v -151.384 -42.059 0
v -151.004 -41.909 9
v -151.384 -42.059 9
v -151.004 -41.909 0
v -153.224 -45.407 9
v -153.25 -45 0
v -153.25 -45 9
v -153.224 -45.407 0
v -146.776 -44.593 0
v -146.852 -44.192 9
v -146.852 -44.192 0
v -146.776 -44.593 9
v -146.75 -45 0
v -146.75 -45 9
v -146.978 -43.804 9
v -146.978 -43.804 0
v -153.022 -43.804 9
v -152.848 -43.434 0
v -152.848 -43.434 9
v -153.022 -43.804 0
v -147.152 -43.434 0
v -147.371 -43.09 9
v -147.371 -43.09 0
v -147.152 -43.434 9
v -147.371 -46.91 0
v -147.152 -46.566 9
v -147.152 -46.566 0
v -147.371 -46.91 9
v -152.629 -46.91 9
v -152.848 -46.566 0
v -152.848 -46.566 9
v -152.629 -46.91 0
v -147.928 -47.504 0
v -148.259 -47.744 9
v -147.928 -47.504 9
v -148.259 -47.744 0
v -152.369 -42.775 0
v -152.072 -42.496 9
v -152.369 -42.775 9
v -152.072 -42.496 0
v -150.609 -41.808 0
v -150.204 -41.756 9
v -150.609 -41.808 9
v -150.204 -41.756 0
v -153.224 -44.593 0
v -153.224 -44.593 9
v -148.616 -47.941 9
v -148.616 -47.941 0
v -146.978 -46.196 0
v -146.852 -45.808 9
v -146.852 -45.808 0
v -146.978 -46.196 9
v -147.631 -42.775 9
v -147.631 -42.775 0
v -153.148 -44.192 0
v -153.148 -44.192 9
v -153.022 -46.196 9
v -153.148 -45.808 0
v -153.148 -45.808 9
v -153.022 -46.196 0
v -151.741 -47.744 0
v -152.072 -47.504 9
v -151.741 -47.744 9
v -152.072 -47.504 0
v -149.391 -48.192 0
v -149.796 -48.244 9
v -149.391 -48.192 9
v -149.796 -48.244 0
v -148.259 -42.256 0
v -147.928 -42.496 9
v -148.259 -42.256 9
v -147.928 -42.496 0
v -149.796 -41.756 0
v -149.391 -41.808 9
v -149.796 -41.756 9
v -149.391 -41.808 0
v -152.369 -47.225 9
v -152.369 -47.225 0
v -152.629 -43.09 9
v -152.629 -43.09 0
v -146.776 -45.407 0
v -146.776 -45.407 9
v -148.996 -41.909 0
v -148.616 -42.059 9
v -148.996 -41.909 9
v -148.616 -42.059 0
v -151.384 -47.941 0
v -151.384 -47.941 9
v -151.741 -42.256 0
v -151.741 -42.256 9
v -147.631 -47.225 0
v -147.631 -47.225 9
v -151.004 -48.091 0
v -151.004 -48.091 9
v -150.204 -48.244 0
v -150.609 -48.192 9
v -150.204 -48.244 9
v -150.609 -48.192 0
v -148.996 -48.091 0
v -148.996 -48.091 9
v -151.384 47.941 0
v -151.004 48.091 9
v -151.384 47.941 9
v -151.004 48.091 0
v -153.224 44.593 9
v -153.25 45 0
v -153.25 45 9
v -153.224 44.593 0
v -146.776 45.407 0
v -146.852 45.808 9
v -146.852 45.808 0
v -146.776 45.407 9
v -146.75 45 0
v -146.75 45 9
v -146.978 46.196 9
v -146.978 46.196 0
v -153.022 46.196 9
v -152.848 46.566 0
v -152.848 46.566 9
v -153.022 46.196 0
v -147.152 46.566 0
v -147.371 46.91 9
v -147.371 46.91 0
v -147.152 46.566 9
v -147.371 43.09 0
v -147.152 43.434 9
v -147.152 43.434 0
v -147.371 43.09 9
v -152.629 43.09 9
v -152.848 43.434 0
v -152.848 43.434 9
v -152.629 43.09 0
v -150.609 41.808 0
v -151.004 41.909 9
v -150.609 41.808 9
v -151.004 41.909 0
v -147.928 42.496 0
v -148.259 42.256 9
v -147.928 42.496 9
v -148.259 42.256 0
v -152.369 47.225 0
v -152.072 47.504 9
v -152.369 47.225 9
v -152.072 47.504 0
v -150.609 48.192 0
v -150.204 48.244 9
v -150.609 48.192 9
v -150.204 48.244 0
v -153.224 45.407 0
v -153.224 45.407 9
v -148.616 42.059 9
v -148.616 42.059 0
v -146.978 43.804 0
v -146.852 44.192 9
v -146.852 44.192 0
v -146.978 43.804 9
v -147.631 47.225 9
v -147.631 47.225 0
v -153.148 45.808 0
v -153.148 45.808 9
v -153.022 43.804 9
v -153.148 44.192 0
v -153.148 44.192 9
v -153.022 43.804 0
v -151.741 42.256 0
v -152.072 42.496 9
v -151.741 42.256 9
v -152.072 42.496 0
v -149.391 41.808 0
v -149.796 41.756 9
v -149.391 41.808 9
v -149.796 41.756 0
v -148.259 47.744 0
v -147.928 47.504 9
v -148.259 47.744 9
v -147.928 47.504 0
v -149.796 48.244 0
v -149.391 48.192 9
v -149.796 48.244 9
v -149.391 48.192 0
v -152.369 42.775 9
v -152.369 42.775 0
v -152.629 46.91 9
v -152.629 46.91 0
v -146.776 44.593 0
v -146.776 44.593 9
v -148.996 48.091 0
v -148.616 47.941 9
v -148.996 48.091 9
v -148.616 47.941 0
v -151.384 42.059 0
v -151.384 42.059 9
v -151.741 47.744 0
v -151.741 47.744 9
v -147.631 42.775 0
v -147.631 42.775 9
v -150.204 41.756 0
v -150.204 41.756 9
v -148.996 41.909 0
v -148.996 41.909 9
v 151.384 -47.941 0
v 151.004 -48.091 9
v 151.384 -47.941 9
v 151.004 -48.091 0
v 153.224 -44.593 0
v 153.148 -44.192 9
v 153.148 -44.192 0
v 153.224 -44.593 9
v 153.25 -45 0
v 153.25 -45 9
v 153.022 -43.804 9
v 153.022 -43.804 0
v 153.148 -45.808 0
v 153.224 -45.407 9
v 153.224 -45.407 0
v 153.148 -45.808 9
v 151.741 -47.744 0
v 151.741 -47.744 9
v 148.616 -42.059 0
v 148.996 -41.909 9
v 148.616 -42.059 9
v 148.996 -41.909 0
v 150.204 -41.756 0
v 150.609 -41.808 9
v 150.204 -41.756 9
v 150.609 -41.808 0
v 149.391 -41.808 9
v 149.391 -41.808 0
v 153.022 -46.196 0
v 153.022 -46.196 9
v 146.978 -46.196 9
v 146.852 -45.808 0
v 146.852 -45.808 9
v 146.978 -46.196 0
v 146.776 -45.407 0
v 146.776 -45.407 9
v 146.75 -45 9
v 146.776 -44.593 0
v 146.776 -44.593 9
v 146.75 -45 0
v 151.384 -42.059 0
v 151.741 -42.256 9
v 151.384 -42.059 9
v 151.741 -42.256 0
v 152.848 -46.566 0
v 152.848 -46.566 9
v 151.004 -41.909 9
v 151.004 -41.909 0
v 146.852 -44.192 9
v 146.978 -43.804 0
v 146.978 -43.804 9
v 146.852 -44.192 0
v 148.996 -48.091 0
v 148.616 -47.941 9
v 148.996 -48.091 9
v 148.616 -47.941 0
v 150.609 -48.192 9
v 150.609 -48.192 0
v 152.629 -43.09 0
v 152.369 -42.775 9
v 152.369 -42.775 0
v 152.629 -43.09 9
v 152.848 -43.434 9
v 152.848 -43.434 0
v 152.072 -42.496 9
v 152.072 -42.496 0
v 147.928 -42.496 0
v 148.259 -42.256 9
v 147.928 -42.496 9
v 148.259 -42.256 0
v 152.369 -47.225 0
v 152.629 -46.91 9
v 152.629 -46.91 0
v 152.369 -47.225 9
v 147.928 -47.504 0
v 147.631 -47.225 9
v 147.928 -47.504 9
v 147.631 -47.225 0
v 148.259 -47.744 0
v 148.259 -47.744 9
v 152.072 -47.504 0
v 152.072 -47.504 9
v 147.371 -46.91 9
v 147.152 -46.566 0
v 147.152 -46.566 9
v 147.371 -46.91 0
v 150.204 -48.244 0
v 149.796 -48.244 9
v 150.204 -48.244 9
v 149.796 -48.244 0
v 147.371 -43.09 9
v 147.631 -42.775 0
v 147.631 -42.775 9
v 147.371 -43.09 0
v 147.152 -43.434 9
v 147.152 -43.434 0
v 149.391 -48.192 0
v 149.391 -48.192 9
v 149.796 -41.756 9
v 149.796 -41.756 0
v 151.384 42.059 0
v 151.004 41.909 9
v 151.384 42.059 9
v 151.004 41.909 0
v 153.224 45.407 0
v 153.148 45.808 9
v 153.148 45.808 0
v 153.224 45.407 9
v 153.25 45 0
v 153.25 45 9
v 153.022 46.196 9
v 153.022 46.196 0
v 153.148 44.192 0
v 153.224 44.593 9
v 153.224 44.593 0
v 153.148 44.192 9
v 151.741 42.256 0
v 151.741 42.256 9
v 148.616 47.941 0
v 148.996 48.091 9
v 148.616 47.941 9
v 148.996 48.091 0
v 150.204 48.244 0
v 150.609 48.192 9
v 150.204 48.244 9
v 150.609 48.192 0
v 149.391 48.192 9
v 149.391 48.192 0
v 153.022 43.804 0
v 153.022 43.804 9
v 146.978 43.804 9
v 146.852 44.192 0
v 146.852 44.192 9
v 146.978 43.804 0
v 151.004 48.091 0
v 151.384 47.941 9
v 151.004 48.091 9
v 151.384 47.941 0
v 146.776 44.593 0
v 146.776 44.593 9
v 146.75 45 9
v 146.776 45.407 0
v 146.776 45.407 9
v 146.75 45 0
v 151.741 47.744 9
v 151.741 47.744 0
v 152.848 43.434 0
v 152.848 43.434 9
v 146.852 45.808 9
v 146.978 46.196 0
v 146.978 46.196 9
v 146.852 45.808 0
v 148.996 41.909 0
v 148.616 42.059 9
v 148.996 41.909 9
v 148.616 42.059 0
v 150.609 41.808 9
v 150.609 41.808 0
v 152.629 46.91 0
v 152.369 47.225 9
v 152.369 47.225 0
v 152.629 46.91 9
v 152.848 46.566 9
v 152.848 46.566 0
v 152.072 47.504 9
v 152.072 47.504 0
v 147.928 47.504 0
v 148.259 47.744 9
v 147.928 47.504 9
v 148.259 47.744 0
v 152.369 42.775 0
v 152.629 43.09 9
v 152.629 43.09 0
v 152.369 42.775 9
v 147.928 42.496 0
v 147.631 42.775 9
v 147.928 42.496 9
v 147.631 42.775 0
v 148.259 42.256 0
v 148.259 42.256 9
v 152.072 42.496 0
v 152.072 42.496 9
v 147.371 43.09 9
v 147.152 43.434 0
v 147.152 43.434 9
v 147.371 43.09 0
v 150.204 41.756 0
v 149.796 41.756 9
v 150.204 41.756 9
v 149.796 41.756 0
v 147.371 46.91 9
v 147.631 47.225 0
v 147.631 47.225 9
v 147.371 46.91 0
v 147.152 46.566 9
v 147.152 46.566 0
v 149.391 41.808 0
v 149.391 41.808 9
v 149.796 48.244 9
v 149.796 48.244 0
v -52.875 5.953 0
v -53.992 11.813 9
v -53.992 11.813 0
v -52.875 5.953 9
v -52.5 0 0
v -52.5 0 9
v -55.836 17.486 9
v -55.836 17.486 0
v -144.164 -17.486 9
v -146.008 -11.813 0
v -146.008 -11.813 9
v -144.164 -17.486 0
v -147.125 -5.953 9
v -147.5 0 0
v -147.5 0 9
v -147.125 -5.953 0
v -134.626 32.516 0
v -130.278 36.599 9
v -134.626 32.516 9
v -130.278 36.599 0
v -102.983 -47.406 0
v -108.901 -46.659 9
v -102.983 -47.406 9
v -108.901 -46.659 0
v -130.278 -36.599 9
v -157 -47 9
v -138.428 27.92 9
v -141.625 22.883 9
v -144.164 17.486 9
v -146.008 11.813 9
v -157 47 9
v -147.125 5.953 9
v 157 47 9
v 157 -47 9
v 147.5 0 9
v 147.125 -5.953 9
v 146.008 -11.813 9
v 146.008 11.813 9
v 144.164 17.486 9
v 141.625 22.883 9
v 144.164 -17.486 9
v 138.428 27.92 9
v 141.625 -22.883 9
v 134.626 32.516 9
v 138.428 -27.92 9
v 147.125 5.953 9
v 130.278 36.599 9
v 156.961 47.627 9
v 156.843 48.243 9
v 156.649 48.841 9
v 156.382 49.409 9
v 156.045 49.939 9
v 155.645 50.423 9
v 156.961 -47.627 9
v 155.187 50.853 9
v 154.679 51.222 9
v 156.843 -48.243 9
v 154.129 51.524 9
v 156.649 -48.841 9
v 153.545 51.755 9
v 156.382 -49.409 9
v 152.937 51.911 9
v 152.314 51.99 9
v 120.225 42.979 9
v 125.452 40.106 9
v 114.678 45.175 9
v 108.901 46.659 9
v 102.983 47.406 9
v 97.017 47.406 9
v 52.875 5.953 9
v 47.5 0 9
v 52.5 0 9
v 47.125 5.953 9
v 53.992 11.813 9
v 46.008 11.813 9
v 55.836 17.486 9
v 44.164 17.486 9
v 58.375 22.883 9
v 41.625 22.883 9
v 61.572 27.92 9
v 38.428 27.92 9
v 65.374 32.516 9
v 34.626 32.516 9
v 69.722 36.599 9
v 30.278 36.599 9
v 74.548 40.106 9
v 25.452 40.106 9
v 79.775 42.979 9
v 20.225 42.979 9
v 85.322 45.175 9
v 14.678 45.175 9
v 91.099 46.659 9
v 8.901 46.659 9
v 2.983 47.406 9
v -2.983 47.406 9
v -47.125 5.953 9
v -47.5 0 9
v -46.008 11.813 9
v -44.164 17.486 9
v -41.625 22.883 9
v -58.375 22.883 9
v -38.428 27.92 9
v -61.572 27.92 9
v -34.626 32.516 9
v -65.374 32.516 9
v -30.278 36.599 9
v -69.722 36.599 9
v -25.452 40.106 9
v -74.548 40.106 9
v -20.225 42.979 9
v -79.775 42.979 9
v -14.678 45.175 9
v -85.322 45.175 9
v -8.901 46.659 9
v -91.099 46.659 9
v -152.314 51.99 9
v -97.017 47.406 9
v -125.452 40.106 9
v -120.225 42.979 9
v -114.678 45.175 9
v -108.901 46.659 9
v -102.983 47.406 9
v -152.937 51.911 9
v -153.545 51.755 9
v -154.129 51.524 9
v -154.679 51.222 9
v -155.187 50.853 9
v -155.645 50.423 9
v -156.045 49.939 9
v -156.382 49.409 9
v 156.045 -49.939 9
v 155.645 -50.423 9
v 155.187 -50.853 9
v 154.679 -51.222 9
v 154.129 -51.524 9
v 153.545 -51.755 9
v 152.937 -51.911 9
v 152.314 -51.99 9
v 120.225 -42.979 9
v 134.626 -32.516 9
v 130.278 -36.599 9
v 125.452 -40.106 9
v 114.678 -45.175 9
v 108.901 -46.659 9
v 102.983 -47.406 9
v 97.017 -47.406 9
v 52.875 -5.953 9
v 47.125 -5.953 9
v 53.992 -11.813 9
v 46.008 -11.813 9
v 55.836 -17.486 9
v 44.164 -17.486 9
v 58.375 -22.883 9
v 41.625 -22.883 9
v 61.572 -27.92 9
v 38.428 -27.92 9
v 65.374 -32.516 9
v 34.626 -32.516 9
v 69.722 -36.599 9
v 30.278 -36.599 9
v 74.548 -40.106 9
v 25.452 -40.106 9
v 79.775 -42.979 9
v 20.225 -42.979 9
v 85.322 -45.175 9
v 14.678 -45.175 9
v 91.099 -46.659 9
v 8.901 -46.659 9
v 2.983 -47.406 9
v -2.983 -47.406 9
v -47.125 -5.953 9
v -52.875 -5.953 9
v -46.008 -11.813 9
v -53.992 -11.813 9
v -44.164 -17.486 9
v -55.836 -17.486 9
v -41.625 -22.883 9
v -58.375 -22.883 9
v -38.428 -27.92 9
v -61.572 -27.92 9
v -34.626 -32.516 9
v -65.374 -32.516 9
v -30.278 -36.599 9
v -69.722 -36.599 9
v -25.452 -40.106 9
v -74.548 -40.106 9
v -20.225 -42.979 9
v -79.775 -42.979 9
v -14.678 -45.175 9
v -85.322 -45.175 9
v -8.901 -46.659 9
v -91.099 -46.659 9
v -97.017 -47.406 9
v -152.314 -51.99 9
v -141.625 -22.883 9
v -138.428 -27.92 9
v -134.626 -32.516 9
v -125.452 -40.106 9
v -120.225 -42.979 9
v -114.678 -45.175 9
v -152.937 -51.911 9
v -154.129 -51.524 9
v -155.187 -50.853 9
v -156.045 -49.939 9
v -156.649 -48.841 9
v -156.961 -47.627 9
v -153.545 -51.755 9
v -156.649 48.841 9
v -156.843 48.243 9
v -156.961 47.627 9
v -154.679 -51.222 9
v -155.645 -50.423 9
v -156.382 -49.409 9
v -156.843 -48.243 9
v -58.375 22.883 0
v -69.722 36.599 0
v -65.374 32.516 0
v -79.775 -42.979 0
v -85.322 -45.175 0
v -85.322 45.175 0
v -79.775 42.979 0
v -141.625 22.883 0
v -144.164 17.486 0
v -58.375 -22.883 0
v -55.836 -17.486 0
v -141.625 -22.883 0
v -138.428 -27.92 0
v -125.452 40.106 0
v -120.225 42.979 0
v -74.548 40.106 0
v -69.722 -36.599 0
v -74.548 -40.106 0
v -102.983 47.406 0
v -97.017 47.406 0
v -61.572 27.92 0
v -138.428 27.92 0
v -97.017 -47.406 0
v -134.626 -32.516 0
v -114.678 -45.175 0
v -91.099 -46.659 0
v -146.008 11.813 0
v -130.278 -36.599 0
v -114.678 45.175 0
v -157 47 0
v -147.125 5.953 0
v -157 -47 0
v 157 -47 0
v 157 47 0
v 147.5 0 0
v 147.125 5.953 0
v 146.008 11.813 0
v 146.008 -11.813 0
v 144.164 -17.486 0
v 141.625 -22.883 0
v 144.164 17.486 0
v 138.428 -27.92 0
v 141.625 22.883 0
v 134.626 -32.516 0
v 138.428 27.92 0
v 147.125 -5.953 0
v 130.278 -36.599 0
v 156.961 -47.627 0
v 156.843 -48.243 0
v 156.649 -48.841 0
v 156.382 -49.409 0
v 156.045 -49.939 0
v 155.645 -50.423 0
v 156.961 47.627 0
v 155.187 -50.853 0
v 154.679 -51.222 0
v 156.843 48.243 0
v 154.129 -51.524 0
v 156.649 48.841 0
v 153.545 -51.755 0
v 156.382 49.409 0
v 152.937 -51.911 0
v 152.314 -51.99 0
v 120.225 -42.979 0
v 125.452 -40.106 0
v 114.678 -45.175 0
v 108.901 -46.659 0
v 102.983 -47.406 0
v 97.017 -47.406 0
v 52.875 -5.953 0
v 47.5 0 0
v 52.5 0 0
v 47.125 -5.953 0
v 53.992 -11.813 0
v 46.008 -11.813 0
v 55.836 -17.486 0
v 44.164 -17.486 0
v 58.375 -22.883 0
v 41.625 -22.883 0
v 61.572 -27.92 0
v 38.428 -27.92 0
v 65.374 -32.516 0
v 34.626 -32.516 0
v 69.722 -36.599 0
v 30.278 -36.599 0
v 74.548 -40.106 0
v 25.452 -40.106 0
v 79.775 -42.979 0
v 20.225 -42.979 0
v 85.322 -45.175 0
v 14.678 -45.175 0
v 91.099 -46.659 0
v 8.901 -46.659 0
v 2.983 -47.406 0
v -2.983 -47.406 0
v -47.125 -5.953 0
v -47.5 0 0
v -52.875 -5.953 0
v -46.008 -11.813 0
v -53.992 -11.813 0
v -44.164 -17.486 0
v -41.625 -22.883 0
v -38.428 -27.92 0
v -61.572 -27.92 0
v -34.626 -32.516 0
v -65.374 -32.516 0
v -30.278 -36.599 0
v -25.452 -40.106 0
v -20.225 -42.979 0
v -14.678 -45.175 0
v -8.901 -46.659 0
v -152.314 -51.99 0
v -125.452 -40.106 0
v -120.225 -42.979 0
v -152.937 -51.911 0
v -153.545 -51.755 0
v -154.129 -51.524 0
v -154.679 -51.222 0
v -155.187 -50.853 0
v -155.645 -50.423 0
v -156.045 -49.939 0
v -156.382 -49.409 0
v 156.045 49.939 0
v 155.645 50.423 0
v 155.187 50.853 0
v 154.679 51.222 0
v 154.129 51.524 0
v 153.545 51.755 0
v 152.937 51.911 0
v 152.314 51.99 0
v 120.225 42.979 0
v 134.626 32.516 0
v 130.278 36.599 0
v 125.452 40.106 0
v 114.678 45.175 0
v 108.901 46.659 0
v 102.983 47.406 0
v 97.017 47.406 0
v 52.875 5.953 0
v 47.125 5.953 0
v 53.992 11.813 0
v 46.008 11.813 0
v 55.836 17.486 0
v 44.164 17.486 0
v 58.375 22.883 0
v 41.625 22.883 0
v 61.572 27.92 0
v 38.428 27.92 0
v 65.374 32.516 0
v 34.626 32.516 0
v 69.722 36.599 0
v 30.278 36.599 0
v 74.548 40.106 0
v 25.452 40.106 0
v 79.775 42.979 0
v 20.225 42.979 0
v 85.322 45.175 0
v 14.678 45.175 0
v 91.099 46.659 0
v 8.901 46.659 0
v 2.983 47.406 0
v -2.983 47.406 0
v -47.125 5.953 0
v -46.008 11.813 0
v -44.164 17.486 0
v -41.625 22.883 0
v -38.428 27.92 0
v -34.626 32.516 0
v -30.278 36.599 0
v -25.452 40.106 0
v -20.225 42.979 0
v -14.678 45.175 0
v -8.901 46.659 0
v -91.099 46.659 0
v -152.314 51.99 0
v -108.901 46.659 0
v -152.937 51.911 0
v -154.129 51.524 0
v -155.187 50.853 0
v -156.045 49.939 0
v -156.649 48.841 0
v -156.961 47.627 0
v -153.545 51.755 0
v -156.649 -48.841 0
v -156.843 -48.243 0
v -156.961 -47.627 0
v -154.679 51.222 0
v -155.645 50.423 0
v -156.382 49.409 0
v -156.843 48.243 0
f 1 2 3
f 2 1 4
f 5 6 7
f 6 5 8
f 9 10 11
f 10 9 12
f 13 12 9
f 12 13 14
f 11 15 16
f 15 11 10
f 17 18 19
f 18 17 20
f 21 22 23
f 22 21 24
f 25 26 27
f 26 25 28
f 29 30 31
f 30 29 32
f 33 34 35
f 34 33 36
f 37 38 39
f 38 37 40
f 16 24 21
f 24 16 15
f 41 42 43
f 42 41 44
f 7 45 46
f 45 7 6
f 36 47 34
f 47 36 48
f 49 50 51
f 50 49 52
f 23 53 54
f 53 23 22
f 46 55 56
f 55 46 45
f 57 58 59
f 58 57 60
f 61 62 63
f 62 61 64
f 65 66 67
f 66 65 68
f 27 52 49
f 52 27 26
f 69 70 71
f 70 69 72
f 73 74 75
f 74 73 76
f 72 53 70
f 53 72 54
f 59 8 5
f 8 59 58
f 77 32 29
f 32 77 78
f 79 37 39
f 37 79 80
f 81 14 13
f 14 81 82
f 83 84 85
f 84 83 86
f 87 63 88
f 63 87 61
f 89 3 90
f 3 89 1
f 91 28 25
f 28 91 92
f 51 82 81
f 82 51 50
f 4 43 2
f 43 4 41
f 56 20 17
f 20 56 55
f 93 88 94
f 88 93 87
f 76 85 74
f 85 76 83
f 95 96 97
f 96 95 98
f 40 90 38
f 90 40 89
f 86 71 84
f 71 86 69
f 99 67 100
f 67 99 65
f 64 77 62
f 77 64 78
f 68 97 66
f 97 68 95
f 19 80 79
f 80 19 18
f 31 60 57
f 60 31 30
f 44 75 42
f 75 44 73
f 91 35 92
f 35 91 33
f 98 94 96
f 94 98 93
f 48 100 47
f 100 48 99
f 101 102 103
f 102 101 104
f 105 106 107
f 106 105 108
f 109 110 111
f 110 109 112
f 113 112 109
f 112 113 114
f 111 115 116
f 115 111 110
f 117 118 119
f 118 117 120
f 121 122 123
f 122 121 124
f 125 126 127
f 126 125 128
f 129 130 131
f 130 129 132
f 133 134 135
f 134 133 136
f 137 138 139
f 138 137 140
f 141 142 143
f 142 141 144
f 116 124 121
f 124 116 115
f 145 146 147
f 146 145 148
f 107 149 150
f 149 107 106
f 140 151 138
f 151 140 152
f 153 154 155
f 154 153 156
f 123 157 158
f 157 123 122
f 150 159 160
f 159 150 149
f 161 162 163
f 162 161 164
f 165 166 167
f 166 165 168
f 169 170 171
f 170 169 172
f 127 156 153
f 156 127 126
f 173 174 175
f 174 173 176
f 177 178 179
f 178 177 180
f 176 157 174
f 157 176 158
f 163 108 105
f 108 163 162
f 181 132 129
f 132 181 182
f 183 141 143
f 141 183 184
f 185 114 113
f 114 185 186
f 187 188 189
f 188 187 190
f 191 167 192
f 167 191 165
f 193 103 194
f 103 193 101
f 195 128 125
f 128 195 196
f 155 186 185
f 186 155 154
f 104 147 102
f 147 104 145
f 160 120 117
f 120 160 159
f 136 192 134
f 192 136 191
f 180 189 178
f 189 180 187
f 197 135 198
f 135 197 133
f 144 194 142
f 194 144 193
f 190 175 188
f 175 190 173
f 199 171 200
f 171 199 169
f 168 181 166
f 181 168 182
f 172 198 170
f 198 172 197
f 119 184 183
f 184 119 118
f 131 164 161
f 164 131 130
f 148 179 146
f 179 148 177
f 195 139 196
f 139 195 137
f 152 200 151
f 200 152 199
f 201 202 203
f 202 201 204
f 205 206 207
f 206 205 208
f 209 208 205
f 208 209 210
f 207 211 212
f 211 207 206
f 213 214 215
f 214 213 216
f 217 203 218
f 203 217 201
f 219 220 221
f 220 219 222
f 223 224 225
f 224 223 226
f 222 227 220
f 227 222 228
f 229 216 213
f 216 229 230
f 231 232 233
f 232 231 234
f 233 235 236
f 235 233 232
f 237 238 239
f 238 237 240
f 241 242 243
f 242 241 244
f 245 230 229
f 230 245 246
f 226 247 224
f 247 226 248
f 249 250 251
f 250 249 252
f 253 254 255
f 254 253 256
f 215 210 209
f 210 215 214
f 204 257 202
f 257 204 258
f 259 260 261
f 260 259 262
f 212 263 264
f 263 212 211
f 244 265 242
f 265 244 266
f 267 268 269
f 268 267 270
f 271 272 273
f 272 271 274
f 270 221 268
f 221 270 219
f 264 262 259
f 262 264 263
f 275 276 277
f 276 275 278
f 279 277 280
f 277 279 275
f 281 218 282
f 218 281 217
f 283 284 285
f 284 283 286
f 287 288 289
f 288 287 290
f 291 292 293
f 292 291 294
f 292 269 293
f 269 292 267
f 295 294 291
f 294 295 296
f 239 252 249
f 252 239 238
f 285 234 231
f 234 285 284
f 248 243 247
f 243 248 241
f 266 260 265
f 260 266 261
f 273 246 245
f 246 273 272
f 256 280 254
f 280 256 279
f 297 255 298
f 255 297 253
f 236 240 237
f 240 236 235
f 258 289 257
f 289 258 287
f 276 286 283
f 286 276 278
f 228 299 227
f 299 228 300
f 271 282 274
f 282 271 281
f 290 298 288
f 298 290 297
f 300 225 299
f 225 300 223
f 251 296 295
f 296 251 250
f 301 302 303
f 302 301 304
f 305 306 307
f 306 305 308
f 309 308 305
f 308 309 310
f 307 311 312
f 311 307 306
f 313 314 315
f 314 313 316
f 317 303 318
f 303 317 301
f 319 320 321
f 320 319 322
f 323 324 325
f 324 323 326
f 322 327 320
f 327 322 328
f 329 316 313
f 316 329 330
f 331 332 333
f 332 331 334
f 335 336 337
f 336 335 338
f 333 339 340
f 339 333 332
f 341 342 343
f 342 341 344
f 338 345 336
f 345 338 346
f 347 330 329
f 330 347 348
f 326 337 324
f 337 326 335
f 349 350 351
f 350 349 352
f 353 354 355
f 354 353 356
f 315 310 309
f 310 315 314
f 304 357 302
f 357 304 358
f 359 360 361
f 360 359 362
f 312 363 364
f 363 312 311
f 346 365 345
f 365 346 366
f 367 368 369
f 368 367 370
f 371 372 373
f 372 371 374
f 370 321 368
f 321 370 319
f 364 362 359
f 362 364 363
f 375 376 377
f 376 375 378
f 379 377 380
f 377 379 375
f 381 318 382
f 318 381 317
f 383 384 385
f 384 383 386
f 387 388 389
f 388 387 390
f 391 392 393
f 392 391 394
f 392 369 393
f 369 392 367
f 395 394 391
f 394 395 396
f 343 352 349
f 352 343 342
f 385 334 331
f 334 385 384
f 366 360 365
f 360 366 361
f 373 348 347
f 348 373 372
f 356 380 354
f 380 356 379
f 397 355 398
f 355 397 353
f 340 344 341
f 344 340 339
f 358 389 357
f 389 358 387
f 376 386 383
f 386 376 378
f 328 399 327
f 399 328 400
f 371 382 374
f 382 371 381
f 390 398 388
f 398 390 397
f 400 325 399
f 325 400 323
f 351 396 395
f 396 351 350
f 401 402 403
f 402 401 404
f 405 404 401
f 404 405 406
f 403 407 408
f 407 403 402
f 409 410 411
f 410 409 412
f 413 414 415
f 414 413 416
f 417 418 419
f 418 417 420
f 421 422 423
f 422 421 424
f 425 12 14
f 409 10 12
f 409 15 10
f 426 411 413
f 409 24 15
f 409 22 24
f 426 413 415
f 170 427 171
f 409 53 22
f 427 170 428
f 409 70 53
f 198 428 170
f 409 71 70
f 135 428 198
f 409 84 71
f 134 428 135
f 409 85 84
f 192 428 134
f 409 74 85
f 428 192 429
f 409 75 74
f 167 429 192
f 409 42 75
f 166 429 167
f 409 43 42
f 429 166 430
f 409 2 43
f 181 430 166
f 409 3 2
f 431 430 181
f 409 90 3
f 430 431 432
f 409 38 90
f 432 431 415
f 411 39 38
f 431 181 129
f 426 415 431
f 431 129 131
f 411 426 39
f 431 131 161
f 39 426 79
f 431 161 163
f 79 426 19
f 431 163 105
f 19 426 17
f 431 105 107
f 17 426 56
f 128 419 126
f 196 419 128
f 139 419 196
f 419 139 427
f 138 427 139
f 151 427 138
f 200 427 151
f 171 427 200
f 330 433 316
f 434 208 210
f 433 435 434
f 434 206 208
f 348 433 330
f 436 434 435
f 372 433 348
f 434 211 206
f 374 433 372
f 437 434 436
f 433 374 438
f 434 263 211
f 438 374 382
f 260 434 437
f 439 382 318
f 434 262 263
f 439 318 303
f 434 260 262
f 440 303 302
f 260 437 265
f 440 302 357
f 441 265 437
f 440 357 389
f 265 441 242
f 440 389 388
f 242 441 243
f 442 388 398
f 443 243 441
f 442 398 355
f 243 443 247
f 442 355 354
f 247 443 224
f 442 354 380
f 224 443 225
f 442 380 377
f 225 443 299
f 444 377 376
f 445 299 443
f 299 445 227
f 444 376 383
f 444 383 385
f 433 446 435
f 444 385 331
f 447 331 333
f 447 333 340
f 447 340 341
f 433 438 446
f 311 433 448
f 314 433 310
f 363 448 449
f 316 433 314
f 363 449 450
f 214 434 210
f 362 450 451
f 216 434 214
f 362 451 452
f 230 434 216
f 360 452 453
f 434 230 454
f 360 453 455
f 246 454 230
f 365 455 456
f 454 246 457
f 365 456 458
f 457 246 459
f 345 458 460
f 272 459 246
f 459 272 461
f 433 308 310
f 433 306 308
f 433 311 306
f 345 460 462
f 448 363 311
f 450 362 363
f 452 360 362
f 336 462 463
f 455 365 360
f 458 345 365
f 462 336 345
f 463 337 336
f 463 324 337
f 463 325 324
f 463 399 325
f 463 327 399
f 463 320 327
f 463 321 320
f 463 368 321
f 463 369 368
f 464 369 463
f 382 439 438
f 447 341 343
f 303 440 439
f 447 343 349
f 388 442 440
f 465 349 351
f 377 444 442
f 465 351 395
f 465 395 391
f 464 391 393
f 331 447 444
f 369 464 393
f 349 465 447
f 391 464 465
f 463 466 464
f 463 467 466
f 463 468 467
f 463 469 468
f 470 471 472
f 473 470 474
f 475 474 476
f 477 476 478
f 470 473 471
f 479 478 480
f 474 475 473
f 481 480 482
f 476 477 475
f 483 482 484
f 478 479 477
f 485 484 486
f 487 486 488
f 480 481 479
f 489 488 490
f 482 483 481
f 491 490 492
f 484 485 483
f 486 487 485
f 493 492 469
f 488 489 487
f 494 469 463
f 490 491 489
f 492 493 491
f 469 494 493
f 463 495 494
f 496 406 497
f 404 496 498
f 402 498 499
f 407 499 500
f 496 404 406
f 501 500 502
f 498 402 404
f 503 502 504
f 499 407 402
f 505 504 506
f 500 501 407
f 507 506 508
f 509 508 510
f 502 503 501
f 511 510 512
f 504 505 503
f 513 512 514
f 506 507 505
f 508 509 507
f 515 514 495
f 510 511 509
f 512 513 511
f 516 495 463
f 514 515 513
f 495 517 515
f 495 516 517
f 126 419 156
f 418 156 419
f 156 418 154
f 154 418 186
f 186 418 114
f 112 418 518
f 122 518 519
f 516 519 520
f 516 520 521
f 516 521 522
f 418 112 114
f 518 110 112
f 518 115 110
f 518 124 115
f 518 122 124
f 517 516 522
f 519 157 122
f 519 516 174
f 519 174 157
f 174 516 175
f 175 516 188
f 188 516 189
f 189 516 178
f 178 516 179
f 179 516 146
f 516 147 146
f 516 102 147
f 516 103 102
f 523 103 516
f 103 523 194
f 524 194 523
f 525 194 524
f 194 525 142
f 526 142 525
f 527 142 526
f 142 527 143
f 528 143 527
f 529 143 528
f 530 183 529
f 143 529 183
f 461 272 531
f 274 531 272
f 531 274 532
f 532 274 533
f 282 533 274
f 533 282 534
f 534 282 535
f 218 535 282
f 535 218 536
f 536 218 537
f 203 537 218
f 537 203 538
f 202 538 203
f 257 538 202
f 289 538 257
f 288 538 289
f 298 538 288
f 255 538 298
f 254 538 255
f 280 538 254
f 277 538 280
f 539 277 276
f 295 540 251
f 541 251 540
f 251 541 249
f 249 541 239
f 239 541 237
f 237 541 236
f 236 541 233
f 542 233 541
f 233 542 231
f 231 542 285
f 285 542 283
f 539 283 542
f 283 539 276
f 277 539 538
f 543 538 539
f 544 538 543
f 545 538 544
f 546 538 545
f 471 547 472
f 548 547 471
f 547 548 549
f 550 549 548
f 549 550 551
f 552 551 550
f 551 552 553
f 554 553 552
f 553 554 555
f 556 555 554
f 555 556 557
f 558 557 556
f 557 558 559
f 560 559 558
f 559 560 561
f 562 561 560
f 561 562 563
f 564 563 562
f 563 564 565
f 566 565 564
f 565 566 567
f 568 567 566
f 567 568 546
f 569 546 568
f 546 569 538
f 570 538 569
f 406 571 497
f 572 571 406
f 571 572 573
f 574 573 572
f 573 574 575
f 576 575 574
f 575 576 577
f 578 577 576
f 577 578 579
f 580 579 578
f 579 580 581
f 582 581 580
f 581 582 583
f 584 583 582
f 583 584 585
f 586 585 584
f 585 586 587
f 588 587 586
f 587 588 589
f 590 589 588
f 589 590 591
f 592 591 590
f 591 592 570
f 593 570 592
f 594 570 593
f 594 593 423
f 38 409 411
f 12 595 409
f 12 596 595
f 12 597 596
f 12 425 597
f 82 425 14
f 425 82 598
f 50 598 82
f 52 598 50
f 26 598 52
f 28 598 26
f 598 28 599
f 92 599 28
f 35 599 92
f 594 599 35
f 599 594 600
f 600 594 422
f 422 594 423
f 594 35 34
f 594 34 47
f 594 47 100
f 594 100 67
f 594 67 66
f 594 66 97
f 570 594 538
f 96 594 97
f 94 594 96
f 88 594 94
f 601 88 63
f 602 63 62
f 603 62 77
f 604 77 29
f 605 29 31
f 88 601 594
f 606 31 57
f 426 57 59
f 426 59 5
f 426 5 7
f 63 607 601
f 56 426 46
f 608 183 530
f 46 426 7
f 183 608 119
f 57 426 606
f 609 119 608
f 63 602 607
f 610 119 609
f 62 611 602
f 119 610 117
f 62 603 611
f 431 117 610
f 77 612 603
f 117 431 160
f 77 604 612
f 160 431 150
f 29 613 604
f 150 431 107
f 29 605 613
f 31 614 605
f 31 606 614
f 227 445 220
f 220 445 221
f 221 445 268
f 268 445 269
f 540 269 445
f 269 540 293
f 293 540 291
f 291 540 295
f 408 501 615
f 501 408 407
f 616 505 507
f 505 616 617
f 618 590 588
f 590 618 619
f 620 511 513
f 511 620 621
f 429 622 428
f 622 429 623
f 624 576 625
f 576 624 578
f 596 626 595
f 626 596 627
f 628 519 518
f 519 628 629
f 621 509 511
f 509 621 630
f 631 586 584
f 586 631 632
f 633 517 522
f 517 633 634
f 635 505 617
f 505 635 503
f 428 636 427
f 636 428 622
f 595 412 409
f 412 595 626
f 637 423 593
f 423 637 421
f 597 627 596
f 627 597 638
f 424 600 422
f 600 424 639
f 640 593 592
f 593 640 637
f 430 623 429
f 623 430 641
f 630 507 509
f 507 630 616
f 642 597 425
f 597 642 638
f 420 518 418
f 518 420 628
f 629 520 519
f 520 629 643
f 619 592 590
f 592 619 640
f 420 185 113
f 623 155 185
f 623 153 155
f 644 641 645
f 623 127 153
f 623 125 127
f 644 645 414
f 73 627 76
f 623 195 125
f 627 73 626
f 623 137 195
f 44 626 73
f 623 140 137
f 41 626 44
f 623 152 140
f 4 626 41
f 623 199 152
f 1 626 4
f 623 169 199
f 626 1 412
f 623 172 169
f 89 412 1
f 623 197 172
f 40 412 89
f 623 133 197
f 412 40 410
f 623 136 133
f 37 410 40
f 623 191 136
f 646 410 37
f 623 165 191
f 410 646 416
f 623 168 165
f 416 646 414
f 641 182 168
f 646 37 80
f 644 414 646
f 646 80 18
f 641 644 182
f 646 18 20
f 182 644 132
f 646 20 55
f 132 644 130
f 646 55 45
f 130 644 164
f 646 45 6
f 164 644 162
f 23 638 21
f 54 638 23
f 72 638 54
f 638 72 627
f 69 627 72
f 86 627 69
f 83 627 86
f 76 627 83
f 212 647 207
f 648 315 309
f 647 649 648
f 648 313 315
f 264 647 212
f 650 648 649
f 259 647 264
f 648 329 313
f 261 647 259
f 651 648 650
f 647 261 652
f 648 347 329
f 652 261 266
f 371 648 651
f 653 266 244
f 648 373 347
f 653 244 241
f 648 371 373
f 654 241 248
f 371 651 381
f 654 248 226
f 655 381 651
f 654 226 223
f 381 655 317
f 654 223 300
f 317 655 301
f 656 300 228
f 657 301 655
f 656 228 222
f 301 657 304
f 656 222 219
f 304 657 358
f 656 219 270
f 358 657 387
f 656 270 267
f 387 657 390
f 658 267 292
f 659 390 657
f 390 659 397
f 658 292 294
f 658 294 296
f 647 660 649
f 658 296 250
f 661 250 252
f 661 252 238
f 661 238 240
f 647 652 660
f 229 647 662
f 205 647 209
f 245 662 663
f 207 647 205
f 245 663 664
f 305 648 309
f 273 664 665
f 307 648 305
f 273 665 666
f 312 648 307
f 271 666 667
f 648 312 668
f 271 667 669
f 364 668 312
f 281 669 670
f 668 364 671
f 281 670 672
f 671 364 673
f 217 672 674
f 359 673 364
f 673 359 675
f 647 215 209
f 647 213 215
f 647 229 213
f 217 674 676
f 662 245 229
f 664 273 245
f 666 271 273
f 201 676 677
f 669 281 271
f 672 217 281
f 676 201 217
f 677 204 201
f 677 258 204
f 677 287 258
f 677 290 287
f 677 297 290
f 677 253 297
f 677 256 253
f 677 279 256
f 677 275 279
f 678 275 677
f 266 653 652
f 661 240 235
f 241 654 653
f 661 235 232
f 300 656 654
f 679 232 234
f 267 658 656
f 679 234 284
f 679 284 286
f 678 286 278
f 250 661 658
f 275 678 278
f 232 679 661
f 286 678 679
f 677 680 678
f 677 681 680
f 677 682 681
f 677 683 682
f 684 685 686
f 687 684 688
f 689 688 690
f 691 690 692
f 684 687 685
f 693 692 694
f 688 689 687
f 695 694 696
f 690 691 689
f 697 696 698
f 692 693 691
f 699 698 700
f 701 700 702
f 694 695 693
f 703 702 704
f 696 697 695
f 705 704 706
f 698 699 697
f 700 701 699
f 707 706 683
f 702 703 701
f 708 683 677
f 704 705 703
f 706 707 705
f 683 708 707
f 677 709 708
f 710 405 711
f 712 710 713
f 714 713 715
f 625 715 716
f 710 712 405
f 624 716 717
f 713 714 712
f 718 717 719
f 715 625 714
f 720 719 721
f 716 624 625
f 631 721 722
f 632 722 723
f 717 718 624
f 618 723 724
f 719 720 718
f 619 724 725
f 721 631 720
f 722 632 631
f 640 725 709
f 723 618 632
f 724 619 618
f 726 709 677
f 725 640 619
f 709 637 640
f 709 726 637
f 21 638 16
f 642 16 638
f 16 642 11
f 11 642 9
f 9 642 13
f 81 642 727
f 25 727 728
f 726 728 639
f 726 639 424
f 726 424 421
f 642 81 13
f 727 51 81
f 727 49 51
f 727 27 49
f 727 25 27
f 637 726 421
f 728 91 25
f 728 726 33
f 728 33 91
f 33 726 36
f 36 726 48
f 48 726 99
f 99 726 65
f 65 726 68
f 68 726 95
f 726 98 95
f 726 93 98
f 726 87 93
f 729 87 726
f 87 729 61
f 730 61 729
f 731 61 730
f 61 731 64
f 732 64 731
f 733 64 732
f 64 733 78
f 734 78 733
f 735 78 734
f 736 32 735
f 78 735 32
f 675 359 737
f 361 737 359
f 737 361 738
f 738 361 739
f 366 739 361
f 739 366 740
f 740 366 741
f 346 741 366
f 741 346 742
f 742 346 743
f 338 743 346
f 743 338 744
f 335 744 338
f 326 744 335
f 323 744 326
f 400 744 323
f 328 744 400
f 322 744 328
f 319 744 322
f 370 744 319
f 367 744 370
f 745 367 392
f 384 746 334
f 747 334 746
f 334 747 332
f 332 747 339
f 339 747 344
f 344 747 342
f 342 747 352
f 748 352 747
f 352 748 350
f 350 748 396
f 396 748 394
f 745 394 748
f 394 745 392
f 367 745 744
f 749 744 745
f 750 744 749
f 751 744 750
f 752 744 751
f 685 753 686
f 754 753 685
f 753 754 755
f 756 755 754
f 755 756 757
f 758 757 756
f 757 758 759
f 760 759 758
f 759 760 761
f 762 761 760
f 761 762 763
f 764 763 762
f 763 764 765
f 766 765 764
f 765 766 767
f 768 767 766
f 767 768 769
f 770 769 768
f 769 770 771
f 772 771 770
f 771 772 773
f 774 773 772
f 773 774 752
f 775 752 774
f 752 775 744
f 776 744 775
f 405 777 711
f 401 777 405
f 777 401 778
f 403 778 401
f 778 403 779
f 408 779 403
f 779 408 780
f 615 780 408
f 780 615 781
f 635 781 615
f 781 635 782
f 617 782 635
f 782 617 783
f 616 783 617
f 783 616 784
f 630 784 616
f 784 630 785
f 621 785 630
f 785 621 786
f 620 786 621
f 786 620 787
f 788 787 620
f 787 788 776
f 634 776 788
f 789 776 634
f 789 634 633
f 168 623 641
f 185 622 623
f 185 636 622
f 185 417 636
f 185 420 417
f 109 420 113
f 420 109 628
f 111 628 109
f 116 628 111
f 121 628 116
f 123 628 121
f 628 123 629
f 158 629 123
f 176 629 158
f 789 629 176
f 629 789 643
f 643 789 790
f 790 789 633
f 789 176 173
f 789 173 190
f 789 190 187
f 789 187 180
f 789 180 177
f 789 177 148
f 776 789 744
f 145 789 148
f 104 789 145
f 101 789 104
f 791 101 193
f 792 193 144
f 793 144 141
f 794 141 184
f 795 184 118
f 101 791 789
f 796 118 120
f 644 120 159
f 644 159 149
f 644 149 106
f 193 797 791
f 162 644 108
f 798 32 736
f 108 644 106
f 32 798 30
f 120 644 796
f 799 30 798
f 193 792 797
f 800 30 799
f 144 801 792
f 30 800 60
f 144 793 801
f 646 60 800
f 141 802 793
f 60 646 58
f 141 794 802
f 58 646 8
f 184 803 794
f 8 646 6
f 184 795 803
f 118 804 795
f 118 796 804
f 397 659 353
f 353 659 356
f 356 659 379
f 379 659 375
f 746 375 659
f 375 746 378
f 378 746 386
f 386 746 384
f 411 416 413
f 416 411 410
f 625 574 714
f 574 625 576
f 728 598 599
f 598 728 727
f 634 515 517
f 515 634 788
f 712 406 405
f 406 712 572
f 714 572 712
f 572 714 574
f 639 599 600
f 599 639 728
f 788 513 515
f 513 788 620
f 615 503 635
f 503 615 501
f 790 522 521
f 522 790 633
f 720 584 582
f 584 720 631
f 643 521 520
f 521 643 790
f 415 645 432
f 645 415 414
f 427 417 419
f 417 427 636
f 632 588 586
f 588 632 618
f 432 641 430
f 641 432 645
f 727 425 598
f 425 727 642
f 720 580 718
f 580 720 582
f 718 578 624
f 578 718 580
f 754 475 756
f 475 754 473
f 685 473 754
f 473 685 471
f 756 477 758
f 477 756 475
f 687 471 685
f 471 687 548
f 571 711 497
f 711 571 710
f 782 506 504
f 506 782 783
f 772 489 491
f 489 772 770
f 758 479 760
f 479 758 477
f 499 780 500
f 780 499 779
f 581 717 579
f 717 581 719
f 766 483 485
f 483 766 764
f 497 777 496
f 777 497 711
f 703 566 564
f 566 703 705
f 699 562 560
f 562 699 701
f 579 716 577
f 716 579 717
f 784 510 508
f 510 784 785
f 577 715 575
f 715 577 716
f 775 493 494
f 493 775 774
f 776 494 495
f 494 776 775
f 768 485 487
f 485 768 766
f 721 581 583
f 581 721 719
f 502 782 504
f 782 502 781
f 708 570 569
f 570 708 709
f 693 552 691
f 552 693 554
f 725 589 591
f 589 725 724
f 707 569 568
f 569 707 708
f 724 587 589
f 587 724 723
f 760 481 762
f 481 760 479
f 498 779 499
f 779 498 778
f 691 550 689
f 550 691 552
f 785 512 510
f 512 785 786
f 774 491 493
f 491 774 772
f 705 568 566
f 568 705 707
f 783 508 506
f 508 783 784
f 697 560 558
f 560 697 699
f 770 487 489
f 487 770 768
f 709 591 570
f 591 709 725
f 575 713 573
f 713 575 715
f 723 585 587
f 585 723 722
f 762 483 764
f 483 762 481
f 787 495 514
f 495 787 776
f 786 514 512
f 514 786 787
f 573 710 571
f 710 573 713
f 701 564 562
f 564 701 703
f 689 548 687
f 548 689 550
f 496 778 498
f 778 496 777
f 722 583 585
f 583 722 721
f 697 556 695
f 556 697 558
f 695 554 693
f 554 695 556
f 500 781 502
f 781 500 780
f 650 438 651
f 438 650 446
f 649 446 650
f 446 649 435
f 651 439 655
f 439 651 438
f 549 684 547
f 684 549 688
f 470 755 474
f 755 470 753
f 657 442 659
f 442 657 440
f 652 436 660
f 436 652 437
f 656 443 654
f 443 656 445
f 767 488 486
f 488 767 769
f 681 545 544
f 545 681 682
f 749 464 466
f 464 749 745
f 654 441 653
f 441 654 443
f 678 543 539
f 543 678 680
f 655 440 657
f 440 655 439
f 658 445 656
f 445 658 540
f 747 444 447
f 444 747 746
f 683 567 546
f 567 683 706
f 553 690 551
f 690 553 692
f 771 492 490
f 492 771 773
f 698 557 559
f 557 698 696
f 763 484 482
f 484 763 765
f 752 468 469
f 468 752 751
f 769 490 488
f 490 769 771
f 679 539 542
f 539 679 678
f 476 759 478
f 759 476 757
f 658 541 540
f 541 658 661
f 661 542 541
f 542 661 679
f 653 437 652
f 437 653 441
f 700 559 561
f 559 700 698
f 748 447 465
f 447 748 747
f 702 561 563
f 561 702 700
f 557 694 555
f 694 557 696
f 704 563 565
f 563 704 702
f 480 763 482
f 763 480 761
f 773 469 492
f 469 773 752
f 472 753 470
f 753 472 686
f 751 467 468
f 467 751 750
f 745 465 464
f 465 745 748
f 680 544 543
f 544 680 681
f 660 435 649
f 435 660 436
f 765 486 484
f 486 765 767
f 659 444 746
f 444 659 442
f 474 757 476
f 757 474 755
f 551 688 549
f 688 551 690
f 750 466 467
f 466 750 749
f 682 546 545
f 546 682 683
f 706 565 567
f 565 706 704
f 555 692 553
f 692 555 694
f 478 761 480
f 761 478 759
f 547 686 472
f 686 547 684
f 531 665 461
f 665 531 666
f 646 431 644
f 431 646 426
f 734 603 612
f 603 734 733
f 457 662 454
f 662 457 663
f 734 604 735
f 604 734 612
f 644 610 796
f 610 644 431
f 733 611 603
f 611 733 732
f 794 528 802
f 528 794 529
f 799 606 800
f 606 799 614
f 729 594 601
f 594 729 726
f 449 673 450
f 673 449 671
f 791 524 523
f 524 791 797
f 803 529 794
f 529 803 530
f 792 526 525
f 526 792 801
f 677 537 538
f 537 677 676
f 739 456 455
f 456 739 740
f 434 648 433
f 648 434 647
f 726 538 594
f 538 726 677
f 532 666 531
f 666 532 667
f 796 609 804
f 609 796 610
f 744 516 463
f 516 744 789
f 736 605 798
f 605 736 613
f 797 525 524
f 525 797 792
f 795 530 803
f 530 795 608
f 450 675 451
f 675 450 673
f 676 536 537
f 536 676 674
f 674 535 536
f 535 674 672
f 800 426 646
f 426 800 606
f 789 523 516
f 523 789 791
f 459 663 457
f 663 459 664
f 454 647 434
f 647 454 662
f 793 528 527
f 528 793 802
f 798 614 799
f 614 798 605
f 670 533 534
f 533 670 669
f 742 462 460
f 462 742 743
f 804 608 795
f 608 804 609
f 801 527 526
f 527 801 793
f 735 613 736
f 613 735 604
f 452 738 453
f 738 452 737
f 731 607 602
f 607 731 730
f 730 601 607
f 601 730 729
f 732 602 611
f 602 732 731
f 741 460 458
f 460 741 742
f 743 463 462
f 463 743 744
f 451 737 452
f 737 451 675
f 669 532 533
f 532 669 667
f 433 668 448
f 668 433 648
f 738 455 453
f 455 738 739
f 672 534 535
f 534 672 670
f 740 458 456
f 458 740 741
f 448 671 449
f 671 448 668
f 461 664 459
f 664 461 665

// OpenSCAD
$fn = 50;

difference() {
	union() {
		hull() {
			translate(v = [-152.0, 47.0, 0]) {
				cylinder(h = 9, r = 5);
			}
			translate(v = [152.0, 47.0, 0]) {
				cylinder(h = 9, r = 5);
			}
			translate(v = [-152.0, -47.0, 0]) {
				cylinder(h = 9, r = 5);
			}
			translate(v = [152.0, -47.0, 0]) {
				cylinder(h = 9, r = 5);
			}
		}
	}
	union() {
		translate(v = [-150.0, -45.0, -100.0]) {
			cylinder(h = 200, r = 3.25);
		}
		translate(v = [-150.0, 45.0, -100.0]) {
			cylinder(h = 200, r = 3.25);
		}
		translate(v = [150.0, -45.0, -100.0]) {
			cylinder(h = 200, r = 3.25);
		}
		translate(v = [150.0, 45.0, -100.0]) {
			cylinder(h = 200, r = 3.25);
		}
		translate(v = [-150.0, -45.0, -100.0]) {
			cylinder(h = 200, r = 1.8);
		}
		translate(v = [-150.0, 45.0, -100.0]) {
			cylinder(h = 200, r = 1.8);
		}
		translate(v = [150.0, -45.0, -100.0]) {
			cylinder(h = 200, r = 1.8);
		}
		translate(v = [150.0, 45.0, -100.0]) {
			cylinder(h = 200, r = 1.8);
		}
		translate(v = [-100.0, 0, 0.0]) {
			cylinder(h = 9, r = 47.5);
		}
		cylinder(h = 9, r = 47.5);
		translate(v = [100.0, 0, 0.0]) {
			cylinder(h = 9, r = 47.5);
		}
	}
}
